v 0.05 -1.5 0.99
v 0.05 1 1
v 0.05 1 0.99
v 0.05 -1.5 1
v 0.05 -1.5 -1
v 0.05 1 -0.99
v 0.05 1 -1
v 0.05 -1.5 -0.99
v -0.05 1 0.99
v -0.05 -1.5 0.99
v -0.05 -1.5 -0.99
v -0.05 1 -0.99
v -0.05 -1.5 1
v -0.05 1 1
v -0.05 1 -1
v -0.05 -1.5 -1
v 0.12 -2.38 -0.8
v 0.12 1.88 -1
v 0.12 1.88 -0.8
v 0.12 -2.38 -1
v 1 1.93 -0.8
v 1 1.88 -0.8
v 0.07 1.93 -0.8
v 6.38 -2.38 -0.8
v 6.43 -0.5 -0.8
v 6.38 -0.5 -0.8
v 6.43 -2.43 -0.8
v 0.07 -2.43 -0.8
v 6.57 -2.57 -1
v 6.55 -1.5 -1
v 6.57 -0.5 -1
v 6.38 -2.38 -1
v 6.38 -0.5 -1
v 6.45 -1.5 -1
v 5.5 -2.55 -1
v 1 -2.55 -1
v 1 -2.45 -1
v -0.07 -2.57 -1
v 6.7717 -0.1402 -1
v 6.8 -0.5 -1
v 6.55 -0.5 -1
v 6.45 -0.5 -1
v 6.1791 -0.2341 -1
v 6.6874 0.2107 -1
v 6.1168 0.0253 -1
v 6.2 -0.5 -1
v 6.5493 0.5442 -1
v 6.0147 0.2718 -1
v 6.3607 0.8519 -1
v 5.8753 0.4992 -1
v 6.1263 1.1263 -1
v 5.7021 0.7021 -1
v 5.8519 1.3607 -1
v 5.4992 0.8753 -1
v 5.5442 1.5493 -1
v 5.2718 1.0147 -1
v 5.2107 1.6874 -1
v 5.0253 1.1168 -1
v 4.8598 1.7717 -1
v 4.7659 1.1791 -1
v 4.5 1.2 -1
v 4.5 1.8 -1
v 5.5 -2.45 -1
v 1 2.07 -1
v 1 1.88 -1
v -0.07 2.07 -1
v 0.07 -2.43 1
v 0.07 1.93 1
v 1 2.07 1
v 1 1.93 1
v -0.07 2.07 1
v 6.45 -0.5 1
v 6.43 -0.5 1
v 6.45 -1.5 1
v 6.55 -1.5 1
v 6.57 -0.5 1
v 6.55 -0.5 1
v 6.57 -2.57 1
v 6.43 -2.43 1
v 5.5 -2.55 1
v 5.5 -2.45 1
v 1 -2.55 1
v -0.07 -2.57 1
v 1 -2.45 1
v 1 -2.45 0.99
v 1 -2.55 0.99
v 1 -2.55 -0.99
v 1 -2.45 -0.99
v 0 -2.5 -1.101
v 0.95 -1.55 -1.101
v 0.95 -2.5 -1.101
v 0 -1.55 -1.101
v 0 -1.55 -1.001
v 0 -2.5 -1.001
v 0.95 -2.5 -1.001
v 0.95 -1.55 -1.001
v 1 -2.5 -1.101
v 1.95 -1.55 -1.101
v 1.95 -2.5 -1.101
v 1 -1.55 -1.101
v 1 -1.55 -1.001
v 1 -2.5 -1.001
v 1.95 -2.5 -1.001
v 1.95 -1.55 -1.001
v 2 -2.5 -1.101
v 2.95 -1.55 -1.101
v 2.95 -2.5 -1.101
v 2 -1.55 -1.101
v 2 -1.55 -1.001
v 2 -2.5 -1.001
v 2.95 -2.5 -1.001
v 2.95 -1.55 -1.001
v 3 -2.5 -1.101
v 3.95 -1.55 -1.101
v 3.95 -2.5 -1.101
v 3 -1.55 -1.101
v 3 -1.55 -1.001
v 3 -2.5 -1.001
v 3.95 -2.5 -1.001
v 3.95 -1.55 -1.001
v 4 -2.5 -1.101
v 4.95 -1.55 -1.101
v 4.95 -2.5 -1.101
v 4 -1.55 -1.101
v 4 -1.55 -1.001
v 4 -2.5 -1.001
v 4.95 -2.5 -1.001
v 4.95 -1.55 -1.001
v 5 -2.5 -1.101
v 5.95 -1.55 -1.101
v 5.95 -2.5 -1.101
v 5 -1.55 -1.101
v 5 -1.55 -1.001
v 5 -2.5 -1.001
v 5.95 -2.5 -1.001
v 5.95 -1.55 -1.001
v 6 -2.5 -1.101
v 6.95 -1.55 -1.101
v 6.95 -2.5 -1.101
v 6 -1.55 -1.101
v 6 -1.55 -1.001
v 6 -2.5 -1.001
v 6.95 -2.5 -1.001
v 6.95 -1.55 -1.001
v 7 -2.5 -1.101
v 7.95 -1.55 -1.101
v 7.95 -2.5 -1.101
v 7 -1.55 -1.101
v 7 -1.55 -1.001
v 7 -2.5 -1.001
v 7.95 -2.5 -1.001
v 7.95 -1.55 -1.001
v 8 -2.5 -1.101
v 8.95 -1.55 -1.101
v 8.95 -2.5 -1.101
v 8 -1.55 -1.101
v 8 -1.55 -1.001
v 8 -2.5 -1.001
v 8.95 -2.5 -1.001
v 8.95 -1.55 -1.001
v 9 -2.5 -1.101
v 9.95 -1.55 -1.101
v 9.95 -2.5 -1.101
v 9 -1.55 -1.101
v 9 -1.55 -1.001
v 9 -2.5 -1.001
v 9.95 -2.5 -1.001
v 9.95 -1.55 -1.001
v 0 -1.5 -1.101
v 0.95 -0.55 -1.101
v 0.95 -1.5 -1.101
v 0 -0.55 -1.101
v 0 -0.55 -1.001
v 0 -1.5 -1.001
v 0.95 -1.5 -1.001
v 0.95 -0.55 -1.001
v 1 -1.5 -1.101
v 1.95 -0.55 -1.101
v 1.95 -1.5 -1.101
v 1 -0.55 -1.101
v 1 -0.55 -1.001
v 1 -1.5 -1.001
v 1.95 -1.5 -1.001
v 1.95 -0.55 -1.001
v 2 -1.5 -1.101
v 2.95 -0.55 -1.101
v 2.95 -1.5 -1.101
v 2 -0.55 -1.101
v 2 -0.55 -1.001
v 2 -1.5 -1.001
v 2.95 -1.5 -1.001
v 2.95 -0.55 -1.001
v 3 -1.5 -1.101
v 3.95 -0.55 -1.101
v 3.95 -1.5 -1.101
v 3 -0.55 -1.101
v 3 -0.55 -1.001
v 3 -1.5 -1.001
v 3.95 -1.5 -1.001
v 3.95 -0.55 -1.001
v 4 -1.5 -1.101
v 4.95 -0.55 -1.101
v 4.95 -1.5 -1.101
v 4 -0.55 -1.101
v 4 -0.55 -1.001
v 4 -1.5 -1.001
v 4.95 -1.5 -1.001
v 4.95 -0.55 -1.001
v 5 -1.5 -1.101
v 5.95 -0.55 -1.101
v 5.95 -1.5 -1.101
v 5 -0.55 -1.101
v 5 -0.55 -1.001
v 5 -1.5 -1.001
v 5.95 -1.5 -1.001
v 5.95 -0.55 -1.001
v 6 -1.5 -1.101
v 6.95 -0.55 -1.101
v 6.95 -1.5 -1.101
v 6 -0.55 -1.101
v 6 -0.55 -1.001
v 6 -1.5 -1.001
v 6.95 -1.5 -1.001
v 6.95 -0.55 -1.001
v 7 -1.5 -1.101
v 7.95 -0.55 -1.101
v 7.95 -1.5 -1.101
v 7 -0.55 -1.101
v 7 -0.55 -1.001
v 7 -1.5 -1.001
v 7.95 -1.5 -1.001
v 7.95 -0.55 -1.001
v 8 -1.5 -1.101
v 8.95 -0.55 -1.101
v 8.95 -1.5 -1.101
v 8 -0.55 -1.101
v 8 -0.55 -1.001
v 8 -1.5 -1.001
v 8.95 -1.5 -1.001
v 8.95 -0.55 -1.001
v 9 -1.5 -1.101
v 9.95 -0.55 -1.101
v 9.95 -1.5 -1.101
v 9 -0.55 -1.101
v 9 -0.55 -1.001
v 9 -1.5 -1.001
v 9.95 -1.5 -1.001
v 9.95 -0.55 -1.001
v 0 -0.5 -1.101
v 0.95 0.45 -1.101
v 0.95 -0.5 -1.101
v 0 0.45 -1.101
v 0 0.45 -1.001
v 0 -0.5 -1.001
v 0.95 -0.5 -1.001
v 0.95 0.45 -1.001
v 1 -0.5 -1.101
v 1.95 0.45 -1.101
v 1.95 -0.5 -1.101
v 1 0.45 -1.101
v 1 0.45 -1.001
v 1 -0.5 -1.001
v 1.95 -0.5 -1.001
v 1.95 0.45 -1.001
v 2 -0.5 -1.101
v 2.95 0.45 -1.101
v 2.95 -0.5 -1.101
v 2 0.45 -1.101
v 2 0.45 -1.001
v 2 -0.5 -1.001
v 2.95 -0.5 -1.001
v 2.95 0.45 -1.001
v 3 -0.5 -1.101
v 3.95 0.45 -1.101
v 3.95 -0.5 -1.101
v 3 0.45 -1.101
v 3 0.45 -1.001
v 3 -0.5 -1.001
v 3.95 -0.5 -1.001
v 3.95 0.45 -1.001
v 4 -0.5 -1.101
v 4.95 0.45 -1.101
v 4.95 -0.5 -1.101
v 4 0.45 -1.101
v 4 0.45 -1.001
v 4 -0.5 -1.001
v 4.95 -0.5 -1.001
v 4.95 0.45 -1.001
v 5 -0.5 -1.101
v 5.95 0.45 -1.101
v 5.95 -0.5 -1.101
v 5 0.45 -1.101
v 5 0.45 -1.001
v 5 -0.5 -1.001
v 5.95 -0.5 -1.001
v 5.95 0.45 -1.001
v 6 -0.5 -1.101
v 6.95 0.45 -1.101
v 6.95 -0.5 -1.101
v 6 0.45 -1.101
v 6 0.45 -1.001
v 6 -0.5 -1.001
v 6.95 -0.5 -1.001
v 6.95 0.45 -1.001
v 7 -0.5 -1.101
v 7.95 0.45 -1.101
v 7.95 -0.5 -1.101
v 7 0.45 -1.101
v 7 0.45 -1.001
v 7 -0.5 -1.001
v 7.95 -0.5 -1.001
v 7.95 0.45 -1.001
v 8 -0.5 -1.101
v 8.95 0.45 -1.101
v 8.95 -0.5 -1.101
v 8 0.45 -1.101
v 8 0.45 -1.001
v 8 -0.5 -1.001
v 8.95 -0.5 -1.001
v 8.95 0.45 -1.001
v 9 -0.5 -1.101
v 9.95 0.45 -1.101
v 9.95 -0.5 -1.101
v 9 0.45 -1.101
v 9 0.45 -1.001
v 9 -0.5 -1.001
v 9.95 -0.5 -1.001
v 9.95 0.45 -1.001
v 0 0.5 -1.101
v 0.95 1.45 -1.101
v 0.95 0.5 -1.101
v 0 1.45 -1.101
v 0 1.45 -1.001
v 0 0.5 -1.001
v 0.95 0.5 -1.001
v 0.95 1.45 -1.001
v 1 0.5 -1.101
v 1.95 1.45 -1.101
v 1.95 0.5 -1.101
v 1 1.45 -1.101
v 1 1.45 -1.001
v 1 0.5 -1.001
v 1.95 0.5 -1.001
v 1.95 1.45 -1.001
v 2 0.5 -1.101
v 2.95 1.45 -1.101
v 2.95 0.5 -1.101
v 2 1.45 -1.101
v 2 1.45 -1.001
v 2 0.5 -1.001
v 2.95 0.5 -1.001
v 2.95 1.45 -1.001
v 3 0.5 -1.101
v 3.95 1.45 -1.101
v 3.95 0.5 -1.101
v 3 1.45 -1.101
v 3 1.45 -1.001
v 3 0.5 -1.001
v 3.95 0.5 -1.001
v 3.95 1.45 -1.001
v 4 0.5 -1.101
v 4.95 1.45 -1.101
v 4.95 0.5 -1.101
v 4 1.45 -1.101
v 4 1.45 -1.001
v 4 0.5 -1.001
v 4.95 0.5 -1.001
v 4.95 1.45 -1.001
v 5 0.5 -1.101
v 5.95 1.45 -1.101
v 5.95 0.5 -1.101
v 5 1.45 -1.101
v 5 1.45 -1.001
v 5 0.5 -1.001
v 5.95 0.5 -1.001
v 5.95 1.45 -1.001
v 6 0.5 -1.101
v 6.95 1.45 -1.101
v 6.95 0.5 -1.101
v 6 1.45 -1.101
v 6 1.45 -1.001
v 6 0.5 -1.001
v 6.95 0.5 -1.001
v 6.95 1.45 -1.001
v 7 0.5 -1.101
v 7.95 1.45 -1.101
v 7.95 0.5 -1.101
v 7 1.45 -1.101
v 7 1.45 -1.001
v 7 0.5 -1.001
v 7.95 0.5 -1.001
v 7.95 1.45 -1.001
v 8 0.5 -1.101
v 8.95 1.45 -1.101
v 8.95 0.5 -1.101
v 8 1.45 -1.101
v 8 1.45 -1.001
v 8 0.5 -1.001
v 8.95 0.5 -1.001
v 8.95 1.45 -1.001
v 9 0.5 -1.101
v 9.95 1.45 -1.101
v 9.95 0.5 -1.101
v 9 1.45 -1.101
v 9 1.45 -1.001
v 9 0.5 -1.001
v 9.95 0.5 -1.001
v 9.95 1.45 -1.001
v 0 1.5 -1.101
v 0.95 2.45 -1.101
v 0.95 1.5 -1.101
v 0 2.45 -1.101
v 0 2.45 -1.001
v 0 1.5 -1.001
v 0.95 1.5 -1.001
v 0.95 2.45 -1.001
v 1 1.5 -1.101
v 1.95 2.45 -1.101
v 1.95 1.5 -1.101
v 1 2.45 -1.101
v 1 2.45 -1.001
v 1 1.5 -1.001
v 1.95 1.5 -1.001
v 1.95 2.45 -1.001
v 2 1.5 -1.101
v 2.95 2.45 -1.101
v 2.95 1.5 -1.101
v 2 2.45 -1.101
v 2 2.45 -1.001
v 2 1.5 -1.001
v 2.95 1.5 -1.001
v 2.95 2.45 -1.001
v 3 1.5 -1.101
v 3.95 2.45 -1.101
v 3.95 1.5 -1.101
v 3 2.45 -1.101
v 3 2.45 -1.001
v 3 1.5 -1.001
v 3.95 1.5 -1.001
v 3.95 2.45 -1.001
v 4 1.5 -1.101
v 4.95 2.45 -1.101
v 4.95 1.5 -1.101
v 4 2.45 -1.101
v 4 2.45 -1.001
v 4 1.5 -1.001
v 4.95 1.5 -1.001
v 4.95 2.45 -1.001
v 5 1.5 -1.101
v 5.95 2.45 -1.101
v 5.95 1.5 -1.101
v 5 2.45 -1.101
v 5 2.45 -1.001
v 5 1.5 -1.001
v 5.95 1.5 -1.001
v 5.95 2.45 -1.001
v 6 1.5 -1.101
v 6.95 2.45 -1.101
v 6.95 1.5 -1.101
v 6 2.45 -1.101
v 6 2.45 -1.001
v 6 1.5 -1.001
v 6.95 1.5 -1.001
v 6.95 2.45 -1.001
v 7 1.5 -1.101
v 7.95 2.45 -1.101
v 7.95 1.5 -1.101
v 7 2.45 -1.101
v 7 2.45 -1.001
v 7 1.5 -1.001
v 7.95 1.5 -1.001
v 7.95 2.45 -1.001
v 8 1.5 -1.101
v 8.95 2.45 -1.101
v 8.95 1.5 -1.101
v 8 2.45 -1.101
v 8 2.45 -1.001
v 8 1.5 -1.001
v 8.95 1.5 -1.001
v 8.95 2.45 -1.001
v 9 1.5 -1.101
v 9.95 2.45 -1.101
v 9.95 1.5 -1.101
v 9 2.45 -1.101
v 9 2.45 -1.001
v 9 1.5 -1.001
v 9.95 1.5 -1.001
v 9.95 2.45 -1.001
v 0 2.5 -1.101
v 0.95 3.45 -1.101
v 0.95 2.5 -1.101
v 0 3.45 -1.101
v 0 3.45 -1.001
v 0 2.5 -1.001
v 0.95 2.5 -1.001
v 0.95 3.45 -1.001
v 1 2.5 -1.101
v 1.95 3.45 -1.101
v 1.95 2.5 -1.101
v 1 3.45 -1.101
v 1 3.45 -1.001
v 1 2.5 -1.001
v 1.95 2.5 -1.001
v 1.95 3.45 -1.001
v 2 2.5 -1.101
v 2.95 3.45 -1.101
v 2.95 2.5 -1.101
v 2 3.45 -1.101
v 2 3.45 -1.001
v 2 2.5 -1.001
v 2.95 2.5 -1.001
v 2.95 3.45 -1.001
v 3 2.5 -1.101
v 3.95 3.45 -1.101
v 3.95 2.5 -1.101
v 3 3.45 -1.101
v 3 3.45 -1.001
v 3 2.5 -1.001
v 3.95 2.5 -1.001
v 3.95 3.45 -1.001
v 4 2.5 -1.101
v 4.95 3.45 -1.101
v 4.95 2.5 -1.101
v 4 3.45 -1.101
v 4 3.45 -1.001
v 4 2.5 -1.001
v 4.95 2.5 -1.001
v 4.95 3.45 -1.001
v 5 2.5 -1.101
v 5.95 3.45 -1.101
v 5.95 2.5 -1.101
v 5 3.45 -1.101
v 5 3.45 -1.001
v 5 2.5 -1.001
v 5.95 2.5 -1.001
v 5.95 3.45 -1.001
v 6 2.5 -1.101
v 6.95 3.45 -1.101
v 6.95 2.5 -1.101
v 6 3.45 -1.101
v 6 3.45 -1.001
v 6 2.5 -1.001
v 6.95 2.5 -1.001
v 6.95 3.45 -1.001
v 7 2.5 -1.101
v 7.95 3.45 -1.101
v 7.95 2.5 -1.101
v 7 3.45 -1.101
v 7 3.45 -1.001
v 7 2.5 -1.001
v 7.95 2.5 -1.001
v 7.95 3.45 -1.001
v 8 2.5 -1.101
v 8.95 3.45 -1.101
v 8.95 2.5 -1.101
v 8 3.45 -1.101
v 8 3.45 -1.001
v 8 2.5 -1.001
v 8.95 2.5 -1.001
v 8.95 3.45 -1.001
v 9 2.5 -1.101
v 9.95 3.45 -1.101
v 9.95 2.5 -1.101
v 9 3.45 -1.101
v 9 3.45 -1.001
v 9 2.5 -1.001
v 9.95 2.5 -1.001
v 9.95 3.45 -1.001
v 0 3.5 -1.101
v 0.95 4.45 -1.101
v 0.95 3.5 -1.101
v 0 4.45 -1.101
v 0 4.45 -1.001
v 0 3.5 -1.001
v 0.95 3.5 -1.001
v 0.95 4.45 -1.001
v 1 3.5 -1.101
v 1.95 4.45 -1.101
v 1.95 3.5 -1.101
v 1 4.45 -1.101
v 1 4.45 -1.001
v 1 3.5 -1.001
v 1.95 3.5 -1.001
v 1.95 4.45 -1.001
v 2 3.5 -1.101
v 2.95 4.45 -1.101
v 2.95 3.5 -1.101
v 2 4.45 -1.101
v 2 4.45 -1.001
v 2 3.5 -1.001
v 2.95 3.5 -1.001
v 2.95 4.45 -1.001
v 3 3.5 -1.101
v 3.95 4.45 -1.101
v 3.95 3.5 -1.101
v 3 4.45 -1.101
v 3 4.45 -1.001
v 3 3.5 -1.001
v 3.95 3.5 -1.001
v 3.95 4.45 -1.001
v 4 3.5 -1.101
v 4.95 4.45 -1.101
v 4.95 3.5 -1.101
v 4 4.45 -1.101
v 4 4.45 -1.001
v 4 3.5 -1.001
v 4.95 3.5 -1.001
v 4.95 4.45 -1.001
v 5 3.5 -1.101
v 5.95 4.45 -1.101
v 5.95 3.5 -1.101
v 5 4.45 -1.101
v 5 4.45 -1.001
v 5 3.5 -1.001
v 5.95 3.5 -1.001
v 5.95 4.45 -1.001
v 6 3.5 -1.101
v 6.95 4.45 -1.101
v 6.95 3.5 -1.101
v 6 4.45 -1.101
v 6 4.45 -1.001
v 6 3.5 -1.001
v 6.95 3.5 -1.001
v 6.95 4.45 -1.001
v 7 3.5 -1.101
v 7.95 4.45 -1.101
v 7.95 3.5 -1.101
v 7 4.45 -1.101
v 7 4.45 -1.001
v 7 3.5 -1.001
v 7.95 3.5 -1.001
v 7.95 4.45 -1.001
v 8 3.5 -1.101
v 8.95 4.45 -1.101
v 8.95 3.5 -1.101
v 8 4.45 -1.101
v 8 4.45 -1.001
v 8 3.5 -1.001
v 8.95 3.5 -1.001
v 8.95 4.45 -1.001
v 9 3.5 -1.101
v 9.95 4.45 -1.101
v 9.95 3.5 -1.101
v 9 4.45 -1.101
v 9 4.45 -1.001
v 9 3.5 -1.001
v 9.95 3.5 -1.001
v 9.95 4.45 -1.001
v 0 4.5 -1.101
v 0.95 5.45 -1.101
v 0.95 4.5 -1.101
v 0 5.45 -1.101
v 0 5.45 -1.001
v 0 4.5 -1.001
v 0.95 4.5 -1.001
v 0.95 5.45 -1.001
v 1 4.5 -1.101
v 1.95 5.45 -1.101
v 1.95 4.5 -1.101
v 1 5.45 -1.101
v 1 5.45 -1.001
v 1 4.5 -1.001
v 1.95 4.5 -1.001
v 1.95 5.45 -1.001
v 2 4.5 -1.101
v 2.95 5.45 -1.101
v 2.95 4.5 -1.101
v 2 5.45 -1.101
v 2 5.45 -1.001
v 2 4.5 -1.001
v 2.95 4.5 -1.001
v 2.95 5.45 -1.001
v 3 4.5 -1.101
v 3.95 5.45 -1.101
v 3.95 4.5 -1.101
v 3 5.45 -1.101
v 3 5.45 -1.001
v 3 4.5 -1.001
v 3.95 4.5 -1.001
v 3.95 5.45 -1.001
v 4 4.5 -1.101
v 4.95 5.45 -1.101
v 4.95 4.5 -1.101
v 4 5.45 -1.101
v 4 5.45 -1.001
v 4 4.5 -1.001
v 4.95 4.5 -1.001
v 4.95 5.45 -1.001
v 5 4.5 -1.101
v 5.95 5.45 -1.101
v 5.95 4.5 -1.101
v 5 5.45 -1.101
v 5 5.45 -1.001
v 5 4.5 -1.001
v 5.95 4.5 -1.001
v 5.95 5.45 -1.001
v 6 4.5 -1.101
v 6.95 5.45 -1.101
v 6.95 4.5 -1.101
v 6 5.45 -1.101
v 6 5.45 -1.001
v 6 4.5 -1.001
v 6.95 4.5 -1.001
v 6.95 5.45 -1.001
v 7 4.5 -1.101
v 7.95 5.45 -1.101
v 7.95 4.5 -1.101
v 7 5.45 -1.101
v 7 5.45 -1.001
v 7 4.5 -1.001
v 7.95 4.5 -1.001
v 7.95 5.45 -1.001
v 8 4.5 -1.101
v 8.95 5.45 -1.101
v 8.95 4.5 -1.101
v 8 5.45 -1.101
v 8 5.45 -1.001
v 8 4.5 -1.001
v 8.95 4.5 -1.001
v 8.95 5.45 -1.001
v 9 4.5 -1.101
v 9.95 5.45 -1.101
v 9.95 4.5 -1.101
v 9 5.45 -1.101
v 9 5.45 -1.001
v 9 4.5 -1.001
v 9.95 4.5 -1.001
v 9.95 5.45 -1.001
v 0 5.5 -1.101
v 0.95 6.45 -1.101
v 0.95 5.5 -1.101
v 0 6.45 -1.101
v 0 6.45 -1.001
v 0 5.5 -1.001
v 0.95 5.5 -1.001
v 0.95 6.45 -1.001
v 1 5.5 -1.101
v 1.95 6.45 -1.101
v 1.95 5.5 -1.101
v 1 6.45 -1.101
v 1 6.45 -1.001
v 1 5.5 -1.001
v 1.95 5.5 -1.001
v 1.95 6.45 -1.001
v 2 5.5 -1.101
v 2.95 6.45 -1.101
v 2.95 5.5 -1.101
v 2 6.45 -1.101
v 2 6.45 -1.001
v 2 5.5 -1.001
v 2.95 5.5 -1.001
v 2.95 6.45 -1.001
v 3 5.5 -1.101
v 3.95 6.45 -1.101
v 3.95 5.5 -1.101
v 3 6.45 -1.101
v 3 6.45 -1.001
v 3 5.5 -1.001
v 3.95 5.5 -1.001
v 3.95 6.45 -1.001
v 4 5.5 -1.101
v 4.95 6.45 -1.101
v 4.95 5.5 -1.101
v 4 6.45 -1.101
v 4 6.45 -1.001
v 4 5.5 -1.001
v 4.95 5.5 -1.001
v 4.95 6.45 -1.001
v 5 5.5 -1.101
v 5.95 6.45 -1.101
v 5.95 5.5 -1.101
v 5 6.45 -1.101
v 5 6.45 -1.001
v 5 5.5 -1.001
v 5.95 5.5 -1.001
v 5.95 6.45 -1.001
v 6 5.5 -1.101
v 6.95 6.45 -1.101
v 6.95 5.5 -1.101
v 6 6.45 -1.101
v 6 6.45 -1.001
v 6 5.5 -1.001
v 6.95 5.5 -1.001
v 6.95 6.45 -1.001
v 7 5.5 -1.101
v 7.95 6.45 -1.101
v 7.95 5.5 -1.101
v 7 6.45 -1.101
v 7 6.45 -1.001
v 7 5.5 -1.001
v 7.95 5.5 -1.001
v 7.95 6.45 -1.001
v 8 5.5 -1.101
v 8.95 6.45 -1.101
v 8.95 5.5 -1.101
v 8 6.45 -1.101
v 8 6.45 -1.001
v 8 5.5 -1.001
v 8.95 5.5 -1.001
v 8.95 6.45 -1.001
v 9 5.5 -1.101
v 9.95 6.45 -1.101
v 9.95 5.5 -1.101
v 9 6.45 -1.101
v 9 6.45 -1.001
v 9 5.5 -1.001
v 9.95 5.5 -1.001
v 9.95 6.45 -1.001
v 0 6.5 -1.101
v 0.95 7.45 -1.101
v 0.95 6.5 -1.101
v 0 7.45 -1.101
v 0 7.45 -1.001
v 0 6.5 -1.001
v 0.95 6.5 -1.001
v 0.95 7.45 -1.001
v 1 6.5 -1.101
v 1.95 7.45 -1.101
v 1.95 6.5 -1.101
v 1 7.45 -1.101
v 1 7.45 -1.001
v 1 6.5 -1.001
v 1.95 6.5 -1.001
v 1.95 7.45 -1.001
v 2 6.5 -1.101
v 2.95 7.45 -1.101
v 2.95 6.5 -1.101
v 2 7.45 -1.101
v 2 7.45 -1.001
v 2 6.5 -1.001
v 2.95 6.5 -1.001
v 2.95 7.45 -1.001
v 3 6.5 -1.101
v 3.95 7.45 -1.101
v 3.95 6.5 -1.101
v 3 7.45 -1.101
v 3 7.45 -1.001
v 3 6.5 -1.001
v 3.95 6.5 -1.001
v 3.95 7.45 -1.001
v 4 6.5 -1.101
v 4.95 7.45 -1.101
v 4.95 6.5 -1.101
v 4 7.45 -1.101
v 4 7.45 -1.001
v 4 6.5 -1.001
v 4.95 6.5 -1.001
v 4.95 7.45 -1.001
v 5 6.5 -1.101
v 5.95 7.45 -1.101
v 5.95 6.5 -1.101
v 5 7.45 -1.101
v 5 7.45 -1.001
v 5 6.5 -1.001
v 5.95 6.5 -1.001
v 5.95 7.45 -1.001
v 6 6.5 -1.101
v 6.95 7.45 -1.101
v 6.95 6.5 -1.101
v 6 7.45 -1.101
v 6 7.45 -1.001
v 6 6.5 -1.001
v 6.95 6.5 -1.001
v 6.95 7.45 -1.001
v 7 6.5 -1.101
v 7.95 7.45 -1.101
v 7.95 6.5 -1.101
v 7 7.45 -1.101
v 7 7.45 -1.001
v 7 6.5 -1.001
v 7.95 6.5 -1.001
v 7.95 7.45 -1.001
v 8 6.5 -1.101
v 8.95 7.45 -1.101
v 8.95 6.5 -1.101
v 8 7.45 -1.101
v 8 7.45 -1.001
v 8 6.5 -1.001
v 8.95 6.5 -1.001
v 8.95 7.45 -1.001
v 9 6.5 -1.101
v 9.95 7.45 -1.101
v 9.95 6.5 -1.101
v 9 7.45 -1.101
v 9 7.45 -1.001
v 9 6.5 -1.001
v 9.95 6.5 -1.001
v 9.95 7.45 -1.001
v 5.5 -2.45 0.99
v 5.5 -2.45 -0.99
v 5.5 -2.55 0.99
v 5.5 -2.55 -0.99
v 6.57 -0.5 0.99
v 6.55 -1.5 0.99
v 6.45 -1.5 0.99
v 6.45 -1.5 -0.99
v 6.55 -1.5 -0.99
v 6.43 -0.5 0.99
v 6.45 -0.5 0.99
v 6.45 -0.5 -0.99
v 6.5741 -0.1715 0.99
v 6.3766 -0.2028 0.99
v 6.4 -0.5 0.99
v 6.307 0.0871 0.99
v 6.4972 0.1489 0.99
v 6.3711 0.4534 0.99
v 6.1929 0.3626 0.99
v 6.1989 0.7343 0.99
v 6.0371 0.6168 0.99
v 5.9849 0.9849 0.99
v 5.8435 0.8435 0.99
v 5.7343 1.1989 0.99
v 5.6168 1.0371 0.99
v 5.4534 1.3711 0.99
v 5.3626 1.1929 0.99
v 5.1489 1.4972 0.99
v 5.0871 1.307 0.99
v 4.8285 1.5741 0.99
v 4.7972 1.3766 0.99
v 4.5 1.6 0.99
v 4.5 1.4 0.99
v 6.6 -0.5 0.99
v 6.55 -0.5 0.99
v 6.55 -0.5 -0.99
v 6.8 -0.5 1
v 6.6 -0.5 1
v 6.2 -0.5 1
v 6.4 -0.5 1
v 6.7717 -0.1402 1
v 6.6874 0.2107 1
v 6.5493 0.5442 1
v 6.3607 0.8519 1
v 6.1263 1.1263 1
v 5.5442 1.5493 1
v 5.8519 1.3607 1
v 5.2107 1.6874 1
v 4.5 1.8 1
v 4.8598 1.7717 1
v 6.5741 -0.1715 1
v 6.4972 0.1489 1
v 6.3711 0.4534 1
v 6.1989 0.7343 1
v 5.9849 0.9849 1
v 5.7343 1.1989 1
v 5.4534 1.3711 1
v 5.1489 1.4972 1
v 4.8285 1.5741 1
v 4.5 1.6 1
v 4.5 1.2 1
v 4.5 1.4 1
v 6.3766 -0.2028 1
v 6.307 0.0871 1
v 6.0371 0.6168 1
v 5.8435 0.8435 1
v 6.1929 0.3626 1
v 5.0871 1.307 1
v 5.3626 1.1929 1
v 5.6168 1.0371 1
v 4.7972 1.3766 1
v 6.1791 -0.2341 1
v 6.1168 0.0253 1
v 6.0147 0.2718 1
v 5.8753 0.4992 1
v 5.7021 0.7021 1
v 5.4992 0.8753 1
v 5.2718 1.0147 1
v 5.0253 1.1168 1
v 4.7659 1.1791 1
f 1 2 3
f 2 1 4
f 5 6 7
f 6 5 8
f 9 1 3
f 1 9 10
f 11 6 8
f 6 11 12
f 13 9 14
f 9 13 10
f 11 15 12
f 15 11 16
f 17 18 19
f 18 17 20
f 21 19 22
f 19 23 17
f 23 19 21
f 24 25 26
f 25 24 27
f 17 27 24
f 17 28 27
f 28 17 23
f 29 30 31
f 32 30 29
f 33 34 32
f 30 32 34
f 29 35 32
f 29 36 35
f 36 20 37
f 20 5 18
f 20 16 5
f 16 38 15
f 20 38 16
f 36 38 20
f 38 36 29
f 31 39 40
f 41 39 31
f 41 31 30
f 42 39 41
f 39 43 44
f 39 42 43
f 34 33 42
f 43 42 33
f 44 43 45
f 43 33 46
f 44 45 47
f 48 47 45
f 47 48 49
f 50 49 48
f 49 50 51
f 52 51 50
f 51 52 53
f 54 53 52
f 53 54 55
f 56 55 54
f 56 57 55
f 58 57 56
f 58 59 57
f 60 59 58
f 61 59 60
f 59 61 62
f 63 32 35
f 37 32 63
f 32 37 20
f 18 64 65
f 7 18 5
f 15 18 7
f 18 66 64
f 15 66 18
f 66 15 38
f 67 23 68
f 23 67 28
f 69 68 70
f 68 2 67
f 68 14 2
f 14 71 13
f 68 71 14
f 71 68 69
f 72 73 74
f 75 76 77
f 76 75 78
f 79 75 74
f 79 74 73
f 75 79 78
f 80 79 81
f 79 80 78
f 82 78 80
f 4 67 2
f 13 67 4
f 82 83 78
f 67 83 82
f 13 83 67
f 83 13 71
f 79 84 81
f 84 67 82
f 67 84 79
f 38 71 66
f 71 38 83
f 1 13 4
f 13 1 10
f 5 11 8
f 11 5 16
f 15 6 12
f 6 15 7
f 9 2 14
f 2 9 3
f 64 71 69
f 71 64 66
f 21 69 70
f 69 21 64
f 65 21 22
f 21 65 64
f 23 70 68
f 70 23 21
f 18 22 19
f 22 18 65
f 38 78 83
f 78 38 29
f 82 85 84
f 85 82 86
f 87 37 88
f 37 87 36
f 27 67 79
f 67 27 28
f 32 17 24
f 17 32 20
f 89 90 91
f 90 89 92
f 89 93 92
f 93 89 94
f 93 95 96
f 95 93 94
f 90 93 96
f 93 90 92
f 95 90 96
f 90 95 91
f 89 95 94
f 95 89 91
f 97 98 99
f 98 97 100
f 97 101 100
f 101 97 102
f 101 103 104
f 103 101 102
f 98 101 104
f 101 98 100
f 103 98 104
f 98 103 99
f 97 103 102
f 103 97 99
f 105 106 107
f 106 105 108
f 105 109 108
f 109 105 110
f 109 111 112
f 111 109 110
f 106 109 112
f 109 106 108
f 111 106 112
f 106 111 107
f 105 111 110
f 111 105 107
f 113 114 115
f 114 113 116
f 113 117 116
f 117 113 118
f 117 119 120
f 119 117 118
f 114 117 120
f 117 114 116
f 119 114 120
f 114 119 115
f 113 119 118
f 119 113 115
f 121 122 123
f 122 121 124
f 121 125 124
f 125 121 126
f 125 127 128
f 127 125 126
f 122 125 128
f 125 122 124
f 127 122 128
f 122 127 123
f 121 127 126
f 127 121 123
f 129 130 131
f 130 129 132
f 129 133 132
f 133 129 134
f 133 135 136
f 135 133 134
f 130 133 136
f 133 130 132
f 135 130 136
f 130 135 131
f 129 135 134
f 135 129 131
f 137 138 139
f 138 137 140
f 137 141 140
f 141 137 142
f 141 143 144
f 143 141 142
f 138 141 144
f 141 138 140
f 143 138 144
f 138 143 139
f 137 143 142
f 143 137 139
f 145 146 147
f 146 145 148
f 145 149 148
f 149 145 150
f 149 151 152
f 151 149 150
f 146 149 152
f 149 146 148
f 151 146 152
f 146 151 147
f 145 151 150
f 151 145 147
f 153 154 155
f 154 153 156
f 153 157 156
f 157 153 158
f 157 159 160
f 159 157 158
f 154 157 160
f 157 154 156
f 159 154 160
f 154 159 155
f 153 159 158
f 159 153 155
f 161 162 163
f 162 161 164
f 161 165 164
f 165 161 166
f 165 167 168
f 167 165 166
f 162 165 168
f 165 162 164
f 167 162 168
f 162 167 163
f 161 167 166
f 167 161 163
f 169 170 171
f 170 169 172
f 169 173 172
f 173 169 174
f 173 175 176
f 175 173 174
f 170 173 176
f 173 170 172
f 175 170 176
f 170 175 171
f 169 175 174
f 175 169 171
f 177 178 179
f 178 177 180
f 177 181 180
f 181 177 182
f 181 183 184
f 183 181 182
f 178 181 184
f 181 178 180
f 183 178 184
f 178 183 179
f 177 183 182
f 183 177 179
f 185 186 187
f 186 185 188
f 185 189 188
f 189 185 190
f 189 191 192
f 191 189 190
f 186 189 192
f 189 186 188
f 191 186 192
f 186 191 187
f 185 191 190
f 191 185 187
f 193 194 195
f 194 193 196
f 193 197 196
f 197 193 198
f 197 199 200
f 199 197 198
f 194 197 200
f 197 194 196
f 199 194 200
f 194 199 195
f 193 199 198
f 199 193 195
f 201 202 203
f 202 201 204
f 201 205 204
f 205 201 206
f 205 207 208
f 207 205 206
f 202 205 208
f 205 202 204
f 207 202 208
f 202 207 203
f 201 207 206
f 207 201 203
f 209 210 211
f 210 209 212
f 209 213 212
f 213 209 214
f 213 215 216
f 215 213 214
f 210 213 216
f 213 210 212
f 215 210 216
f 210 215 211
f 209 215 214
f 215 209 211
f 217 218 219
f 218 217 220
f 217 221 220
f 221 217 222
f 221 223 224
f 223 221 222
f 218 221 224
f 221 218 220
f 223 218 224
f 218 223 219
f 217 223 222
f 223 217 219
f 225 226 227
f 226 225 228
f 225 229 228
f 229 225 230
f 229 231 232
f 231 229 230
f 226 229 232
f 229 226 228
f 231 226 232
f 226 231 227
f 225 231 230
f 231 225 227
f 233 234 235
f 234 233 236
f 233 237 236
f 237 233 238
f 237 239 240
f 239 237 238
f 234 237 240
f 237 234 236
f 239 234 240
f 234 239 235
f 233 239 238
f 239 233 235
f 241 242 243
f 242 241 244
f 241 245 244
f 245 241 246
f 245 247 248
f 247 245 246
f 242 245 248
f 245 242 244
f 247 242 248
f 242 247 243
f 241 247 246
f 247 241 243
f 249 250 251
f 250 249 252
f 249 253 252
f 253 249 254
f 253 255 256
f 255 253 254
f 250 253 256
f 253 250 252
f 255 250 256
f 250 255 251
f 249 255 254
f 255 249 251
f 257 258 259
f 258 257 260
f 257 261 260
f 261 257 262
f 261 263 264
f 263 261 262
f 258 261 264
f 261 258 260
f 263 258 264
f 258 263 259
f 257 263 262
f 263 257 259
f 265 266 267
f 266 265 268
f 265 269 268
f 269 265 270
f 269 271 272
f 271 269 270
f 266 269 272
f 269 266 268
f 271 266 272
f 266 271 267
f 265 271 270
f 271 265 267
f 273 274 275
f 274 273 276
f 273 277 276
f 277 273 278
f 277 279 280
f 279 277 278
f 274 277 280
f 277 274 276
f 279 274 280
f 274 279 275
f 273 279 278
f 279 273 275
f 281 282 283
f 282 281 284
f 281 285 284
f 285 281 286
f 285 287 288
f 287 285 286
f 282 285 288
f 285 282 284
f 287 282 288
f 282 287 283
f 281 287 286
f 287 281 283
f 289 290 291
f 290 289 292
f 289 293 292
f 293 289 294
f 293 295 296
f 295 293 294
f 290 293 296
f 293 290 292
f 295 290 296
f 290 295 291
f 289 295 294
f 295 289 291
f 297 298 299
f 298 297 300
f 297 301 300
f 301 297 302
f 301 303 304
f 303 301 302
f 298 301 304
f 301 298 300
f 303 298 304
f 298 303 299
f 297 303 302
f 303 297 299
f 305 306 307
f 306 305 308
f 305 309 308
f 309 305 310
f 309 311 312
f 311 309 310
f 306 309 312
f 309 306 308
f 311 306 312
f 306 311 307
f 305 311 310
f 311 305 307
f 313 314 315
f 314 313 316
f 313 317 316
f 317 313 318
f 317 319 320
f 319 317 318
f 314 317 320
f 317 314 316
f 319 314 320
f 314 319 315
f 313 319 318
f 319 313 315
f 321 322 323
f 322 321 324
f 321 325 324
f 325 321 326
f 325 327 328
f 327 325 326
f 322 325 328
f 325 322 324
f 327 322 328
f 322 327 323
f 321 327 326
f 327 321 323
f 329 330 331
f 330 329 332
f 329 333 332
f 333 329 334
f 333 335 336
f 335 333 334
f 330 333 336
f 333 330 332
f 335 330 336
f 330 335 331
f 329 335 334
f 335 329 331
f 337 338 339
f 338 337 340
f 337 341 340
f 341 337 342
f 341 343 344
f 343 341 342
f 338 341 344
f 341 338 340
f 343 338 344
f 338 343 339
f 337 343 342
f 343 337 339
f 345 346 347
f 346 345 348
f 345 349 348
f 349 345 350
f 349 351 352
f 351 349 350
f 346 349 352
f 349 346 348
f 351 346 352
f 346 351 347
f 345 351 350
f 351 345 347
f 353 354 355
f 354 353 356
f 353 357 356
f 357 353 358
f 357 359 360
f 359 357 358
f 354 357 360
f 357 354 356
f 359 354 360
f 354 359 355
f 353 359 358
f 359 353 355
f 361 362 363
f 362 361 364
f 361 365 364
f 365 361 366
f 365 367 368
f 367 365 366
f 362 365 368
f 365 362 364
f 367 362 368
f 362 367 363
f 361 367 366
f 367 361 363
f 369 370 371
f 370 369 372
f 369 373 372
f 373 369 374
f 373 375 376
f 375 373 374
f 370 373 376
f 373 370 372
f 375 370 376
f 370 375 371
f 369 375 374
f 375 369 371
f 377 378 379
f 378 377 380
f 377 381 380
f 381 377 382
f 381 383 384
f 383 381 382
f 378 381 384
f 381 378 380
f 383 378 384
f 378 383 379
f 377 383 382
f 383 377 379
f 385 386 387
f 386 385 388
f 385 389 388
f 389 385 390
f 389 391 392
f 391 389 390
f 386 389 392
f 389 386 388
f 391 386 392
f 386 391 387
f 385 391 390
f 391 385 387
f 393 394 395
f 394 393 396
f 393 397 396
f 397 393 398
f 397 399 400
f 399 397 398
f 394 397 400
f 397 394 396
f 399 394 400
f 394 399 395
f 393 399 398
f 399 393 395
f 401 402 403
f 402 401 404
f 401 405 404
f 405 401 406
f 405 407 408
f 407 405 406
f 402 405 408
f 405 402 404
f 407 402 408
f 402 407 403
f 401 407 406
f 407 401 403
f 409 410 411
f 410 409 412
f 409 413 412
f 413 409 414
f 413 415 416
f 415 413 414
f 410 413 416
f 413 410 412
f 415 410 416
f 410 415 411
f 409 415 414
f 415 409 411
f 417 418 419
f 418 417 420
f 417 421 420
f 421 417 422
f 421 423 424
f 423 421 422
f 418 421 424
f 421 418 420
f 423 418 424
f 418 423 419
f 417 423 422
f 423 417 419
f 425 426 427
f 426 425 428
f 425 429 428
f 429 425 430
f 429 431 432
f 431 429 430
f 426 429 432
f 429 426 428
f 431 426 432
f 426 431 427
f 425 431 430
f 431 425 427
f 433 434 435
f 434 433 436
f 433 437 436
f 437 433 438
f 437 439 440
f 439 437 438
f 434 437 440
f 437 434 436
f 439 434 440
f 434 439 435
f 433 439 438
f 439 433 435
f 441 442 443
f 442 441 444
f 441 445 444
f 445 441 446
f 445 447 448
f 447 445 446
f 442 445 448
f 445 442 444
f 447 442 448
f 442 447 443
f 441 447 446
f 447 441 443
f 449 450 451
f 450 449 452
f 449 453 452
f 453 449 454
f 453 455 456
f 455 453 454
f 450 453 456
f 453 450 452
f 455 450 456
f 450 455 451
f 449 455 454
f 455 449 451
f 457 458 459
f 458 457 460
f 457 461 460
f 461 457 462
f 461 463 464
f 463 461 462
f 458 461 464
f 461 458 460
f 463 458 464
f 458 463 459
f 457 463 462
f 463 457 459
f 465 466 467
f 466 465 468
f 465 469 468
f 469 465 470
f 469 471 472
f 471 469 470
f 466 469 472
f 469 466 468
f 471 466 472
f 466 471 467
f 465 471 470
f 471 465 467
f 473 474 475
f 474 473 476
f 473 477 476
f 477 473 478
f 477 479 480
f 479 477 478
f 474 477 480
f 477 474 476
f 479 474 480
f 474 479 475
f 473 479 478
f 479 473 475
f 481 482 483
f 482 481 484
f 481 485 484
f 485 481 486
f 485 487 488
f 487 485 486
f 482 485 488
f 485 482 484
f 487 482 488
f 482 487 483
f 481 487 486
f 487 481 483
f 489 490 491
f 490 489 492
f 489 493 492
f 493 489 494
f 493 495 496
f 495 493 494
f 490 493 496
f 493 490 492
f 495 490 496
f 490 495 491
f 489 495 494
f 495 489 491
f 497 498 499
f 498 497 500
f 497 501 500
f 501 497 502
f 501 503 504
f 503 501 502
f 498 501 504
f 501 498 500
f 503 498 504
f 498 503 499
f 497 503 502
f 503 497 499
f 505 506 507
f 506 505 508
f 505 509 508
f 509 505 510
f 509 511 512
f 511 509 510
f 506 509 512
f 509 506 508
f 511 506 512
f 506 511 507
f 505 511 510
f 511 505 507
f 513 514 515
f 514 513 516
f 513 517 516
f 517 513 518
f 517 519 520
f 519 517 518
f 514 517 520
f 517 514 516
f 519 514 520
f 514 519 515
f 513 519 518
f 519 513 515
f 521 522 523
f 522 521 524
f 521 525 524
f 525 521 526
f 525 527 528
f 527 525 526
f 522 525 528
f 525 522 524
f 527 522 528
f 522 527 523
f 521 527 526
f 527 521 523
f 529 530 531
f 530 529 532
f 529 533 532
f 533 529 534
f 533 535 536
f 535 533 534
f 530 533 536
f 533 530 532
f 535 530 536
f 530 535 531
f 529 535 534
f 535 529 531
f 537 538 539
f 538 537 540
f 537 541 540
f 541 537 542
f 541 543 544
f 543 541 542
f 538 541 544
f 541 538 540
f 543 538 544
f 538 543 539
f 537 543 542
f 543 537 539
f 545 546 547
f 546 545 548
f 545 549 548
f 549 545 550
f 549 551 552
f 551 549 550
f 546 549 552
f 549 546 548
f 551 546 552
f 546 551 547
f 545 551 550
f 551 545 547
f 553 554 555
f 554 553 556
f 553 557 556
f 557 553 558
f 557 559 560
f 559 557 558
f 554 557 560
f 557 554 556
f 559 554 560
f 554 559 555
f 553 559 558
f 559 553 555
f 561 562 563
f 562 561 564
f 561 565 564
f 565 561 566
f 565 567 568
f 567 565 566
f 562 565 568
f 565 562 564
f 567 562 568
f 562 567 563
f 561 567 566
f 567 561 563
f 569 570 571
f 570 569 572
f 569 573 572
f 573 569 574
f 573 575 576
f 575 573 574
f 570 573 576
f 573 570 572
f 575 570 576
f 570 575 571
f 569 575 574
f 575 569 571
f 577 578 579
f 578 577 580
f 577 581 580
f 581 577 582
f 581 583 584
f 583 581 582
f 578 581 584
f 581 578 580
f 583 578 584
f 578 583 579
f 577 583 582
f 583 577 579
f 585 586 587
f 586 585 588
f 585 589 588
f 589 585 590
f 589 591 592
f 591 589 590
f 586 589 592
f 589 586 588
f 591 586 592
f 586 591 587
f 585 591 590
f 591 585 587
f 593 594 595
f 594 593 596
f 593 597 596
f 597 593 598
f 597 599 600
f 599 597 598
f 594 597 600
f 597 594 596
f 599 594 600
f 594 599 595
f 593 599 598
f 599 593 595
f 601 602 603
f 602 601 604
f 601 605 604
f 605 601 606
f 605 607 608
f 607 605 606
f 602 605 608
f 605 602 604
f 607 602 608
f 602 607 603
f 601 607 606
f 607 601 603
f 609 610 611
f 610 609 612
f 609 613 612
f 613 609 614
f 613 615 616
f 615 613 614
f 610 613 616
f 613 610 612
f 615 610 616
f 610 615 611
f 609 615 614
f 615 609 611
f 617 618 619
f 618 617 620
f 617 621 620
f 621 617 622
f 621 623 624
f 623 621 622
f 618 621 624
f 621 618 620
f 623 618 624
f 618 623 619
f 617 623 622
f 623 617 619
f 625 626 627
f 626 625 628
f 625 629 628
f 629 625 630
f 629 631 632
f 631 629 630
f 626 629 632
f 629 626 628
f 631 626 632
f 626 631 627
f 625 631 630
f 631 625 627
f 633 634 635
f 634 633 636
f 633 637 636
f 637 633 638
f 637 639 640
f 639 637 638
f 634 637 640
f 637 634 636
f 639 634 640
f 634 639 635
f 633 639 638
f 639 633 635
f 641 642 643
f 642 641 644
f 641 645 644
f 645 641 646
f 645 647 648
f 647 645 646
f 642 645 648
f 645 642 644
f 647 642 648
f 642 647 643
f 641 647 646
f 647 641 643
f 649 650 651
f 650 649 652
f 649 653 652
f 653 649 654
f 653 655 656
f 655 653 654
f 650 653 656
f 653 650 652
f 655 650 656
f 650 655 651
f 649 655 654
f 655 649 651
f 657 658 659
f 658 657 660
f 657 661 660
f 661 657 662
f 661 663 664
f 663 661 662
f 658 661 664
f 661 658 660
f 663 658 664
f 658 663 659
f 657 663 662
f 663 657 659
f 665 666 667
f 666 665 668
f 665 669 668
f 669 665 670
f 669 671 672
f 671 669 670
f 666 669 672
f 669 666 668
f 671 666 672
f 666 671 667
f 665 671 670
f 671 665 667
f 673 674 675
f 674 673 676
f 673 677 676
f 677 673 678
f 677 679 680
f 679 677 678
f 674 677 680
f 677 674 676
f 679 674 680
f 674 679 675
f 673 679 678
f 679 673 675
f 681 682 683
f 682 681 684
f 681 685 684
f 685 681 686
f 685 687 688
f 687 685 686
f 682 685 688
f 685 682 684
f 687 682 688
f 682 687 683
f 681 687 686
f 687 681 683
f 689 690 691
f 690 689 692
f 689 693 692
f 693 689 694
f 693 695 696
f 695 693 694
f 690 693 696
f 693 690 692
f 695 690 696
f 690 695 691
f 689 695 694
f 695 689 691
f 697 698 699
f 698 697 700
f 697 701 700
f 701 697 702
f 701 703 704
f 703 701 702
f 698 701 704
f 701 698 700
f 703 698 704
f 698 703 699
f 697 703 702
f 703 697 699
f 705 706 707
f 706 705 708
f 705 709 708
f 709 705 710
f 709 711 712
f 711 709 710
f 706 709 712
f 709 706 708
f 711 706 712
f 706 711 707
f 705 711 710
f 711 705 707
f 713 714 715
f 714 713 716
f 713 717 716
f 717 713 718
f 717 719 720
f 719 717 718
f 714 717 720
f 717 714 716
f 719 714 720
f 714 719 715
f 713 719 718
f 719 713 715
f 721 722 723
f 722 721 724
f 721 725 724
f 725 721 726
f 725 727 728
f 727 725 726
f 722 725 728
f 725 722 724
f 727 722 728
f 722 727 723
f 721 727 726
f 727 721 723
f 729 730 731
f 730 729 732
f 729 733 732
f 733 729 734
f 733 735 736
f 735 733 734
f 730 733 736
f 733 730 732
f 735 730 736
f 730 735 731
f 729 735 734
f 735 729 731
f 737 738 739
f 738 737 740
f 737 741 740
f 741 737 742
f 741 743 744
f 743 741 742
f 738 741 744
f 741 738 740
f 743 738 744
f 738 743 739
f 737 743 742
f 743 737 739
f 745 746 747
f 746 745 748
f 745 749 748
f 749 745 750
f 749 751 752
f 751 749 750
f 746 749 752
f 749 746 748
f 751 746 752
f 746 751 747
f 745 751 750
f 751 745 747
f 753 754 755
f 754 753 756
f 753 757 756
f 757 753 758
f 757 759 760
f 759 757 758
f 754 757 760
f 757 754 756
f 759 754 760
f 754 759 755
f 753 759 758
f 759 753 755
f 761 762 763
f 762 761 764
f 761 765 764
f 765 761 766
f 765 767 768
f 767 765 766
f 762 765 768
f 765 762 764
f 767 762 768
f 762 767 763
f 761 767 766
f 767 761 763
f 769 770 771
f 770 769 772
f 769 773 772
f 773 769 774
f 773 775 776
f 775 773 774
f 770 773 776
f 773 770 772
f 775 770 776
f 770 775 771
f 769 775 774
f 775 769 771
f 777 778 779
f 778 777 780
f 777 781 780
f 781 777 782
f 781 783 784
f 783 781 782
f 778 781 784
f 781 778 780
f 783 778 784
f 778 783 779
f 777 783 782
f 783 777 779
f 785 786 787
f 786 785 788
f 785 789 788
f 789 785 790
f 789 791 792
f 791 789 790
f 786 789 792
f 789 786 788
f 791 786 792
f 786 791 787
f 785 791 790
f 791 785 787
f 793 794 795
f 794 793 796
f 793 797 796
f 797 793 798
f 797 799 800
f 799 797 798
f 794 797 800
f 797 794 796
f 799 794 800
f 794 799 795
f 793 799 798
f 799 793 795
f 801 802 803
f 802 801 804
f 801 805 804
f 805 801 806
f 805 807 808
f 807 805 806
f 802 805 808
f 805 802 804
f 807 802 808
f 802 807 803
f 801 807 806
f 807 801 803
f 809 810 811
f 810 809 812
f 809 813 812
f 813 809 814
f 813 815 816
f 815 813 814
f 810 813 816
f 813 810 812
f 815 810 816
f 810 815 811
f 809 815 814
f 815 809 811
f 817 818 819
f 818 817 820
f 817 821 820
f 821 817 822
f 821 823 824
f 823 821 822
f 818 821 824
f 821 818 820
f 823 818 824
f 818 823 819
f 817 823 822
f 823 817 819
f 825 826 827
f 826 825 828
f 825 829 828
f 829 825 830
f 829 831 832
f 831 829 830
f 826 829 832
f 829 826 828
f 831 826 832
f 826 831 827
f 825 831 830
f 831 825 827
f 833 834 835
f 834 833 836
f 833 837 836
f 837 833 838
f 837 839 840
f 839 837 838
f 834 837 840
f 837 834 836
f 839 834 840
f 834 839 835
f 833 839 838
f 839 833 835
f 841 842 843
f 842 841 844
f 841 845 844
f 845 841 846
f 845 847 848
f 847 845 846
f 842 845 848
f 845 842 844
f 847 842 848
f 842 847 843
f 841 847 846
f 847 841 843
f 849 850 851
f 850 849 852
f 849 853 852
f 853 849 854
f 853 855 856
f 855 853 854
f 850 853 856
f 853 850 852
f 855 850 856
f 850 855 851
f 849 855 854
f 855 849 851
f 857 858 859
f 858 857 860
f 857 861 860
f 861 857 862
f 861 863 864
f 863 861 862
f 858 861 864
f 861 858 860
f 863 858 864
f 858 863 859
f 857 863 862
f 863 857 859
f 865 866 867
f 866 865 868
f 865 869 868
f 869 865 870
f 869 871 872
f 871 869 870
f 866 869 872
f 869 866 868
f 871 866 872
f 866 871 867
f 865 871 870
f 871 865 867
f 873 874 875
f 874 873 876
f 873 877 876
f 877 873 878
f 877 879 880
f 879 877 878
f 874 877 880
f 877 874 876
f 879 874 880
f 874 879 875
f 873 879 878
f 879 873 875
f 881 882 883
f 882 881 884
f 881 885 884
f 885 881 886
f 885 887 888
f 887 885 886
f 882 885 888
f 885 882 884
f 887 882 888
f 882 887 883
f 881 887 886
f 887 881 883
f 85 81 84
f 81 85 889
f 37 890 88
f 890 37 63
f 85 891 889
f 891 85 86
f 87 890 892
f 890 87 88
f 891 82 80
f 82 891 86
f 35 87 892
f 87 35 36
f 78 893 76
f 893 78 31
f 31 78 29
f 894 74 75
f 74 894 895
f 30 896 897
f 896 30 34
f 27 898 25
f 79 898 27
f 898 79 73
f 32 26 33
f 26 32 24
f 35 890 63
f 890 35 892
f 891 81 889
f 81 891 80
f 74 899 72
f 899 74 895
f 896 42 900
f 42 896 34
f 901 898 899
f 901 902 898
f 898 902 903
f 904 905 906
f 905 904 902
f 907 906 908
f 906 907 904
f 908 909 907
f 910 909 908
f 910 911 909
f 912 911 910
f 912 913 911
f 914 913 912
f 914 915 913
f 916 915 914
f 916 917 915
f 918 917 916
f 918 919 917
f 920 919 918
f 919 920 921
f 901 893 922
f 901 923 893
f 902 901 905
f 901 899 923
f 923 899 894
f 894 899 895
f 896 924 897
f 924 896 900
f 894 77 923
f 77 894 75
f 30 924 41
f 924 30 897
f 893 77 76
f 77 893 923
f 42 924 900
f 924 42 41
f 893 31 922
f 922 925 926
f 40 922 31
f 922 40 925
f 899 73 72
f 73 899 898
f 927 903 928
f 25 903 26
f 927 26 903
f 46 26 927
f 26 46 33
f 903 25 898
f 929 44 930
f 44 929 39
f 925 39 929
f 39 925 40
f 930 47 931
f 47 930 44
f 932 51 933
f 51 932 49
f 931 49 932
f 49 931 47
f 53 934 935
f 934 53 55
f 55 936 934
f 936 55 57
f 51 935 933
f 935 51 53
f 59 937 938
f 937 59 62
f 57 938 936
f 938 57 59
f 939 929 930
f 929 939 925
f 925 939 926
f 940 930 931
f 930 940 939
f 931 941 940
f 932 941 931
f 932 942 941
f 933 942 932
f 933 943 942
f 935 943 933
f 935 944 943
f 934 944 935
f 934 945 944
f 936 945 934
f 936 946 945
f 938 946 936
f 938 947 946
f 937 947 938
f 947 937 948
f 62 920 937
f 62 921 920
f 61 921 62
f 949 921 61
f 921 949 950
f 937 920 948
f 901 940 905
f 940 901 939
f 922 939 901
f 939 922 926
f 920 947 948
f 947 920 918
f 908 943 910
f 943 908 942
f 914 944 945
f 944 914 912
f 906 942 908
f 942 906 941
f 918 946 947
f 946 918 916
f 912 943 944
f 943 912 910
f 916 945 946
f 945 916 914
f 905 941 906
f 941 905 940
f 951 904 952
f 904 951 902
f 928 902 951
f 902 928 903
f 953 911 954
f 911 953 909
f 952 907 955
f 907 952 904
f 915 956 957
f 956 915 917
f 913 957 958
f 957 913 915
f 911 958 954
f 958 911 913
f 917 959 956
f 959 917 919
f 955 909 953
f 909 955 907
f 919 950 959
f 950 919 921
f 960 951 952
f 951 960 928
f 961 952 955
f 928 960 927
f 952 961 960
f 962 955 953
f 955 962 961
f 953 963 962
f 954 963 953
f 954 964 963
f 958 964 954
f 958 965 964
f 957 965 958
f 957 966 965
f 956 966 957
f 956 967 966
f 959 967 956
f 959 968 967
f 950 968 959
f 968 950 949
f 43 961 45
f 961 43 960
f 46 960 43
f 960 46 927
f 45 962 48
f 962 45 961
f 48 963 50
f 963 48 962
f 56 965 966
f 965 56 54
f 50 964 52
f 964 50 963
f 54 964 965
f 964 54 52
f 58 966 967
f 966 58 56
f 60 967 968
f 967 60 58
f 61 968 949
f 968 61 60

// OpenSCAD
// file: Asset_SCAD/Grid_01.scad
module Grid_01(){

color("#a8b0b2")

for (j=[0:1:9]){
    translate([0,j,0])
    
for (i=[0:1:9]) {
    translate([i,0,0]){
    // #linear_extrude(7, scale = 1, center = true)
    linear_extrude(0.1, scale = 1, center = true)
    square(0.95);
    }
}         
 
}
}
    translate([0,0,-0.1]){
    linear_extrude(0.1, scale = 1, center = true)
    square(10);

   }


Grid_01();
// file: Asset_SCAD/Wall_03.scad
module Wall_03(rot = 0){

module Wall_Curve(){
    rotate([0,0,rot * 90]){
    color("white")
    translate([0,0,0])

    difference(){
        intersection(){
            cylinder(3.98,2.1,2.1, $fn=40, center = true);
            cube([3,3,3]);
        }
    
        rotate([0,0,0])
        cylinder(5,1.9,1.9, center= true, $fn=40);
    }
    }

    }
    
    
    rotate([0,0,rot * 90]){
    color("blue")
    translate([0,0,0])

    difference(){
        intersection(){
            cylinder(4,2.3,2.3, $fn=40, center = true);
            cube([3,3,3]);
        }
    
        rotate([0,0,0])
        cylinder(5,2.1,2.1, center= true, $fn=40);
    }
    }
    
    
    rotate([0,0,rot * 90]){
    color("green")
    translate([0,0,0])

    difference(){
        intersection(){
            cylinder(4,1.9,1.9, $fn=40, center = true);
            cube([4,3,3]);
        }
    
        rotate([0,0,0])
        cylinder(6,1.7,1.7, center= true, $fn=40);
    }
    }
    
    
   
    
    Wall_Curve();
 
 
   
}


Wall_03(rot =0);
// file: Asset_SCAD/Wall_02.scad
module Wall_02(rot = 0){


module Wall_01(){
    translate([-0.06,0,0])
    color("white")
    cube([0.02,1,2], center= true);
    
    color("#295f48")
    translate([0.06,0,0])
    color("white")
    cube([0.02,1,2], center= true);
    
    
    color("#b2b2b2")
    cube([0.1,1,2], center= true);
    
    translate([0.095,0,-0.9])    
    color("gray")
    cube([0.05,1,0.2], center= true);

}

rotate([0,0,rot * 90]){
union(){
translate([0,-0.5,0])
Wall_01();

translate([0.5,0,0])
rotate([0,0,-90])
Wall_01();

}

color("white")
translate([-0.035,0.035,0])
rotate([0,0,0])
cube([0.07,0.07,2], center= true);

}
}


Wall_02(rot = 0);
// file: Asset_SCAD/Wall_01.scad
module Wall_01(col = 0, rot = 0){

    rotate([0,0,90 * rot]){
    
    translate([-0.06,0,0])
    color("white")
    cube([0.02,1,2], center= true);
    
    color("#295f48")
    translate([0.06,0,0])
    color("white")
    cube([0.02,1,2], center= true);
    
    
    color("#b2b2b2"){
    cube([0.1,1,1.98], center= true);
    
    translate([0.095,0,-0.9])    
    color("gray")
    cube([0.05,1,0.2], center= true);
    }
    }
}

Wall_01();
// main file
use <Asset_SCAD/Wall_01.scad>
use <Asset_SCAD/Wall_02.scad>
use <Asset_SCAD/Wall_03.scad>
use <Asset_SCAD/Grid_01.scad>

Wall_01(0);

translate([0,1,0])
Wall_01();


translate([0,-1,0])
Wall_01();


translate([0,2,0])
Wall_02();


translate([0,-2.5,0])
Wall_02(1);

translate([0,-2.5,-1.051])
Grid_01();



translate([1.5,-2.5,0])
Wall_01(rot = 1);



translate([2.5,-2.5,0])
Wall_01(rot = 1);

translate([3.5,-2.5,0])
Wall_01(rot = 1);

translate([4.5,-2.5,0])
Wall_01(rot = 1);

translate([5.5,-2.5,0])
Wall_01(rot = 1);

translate([6.5,-2.5,0])
Wall_02(2);

translate([6.5,-1,0])
Wall_01(rot = 2);

translate([4.5,-0.5,-1])
Wall_03(rot = 0);
